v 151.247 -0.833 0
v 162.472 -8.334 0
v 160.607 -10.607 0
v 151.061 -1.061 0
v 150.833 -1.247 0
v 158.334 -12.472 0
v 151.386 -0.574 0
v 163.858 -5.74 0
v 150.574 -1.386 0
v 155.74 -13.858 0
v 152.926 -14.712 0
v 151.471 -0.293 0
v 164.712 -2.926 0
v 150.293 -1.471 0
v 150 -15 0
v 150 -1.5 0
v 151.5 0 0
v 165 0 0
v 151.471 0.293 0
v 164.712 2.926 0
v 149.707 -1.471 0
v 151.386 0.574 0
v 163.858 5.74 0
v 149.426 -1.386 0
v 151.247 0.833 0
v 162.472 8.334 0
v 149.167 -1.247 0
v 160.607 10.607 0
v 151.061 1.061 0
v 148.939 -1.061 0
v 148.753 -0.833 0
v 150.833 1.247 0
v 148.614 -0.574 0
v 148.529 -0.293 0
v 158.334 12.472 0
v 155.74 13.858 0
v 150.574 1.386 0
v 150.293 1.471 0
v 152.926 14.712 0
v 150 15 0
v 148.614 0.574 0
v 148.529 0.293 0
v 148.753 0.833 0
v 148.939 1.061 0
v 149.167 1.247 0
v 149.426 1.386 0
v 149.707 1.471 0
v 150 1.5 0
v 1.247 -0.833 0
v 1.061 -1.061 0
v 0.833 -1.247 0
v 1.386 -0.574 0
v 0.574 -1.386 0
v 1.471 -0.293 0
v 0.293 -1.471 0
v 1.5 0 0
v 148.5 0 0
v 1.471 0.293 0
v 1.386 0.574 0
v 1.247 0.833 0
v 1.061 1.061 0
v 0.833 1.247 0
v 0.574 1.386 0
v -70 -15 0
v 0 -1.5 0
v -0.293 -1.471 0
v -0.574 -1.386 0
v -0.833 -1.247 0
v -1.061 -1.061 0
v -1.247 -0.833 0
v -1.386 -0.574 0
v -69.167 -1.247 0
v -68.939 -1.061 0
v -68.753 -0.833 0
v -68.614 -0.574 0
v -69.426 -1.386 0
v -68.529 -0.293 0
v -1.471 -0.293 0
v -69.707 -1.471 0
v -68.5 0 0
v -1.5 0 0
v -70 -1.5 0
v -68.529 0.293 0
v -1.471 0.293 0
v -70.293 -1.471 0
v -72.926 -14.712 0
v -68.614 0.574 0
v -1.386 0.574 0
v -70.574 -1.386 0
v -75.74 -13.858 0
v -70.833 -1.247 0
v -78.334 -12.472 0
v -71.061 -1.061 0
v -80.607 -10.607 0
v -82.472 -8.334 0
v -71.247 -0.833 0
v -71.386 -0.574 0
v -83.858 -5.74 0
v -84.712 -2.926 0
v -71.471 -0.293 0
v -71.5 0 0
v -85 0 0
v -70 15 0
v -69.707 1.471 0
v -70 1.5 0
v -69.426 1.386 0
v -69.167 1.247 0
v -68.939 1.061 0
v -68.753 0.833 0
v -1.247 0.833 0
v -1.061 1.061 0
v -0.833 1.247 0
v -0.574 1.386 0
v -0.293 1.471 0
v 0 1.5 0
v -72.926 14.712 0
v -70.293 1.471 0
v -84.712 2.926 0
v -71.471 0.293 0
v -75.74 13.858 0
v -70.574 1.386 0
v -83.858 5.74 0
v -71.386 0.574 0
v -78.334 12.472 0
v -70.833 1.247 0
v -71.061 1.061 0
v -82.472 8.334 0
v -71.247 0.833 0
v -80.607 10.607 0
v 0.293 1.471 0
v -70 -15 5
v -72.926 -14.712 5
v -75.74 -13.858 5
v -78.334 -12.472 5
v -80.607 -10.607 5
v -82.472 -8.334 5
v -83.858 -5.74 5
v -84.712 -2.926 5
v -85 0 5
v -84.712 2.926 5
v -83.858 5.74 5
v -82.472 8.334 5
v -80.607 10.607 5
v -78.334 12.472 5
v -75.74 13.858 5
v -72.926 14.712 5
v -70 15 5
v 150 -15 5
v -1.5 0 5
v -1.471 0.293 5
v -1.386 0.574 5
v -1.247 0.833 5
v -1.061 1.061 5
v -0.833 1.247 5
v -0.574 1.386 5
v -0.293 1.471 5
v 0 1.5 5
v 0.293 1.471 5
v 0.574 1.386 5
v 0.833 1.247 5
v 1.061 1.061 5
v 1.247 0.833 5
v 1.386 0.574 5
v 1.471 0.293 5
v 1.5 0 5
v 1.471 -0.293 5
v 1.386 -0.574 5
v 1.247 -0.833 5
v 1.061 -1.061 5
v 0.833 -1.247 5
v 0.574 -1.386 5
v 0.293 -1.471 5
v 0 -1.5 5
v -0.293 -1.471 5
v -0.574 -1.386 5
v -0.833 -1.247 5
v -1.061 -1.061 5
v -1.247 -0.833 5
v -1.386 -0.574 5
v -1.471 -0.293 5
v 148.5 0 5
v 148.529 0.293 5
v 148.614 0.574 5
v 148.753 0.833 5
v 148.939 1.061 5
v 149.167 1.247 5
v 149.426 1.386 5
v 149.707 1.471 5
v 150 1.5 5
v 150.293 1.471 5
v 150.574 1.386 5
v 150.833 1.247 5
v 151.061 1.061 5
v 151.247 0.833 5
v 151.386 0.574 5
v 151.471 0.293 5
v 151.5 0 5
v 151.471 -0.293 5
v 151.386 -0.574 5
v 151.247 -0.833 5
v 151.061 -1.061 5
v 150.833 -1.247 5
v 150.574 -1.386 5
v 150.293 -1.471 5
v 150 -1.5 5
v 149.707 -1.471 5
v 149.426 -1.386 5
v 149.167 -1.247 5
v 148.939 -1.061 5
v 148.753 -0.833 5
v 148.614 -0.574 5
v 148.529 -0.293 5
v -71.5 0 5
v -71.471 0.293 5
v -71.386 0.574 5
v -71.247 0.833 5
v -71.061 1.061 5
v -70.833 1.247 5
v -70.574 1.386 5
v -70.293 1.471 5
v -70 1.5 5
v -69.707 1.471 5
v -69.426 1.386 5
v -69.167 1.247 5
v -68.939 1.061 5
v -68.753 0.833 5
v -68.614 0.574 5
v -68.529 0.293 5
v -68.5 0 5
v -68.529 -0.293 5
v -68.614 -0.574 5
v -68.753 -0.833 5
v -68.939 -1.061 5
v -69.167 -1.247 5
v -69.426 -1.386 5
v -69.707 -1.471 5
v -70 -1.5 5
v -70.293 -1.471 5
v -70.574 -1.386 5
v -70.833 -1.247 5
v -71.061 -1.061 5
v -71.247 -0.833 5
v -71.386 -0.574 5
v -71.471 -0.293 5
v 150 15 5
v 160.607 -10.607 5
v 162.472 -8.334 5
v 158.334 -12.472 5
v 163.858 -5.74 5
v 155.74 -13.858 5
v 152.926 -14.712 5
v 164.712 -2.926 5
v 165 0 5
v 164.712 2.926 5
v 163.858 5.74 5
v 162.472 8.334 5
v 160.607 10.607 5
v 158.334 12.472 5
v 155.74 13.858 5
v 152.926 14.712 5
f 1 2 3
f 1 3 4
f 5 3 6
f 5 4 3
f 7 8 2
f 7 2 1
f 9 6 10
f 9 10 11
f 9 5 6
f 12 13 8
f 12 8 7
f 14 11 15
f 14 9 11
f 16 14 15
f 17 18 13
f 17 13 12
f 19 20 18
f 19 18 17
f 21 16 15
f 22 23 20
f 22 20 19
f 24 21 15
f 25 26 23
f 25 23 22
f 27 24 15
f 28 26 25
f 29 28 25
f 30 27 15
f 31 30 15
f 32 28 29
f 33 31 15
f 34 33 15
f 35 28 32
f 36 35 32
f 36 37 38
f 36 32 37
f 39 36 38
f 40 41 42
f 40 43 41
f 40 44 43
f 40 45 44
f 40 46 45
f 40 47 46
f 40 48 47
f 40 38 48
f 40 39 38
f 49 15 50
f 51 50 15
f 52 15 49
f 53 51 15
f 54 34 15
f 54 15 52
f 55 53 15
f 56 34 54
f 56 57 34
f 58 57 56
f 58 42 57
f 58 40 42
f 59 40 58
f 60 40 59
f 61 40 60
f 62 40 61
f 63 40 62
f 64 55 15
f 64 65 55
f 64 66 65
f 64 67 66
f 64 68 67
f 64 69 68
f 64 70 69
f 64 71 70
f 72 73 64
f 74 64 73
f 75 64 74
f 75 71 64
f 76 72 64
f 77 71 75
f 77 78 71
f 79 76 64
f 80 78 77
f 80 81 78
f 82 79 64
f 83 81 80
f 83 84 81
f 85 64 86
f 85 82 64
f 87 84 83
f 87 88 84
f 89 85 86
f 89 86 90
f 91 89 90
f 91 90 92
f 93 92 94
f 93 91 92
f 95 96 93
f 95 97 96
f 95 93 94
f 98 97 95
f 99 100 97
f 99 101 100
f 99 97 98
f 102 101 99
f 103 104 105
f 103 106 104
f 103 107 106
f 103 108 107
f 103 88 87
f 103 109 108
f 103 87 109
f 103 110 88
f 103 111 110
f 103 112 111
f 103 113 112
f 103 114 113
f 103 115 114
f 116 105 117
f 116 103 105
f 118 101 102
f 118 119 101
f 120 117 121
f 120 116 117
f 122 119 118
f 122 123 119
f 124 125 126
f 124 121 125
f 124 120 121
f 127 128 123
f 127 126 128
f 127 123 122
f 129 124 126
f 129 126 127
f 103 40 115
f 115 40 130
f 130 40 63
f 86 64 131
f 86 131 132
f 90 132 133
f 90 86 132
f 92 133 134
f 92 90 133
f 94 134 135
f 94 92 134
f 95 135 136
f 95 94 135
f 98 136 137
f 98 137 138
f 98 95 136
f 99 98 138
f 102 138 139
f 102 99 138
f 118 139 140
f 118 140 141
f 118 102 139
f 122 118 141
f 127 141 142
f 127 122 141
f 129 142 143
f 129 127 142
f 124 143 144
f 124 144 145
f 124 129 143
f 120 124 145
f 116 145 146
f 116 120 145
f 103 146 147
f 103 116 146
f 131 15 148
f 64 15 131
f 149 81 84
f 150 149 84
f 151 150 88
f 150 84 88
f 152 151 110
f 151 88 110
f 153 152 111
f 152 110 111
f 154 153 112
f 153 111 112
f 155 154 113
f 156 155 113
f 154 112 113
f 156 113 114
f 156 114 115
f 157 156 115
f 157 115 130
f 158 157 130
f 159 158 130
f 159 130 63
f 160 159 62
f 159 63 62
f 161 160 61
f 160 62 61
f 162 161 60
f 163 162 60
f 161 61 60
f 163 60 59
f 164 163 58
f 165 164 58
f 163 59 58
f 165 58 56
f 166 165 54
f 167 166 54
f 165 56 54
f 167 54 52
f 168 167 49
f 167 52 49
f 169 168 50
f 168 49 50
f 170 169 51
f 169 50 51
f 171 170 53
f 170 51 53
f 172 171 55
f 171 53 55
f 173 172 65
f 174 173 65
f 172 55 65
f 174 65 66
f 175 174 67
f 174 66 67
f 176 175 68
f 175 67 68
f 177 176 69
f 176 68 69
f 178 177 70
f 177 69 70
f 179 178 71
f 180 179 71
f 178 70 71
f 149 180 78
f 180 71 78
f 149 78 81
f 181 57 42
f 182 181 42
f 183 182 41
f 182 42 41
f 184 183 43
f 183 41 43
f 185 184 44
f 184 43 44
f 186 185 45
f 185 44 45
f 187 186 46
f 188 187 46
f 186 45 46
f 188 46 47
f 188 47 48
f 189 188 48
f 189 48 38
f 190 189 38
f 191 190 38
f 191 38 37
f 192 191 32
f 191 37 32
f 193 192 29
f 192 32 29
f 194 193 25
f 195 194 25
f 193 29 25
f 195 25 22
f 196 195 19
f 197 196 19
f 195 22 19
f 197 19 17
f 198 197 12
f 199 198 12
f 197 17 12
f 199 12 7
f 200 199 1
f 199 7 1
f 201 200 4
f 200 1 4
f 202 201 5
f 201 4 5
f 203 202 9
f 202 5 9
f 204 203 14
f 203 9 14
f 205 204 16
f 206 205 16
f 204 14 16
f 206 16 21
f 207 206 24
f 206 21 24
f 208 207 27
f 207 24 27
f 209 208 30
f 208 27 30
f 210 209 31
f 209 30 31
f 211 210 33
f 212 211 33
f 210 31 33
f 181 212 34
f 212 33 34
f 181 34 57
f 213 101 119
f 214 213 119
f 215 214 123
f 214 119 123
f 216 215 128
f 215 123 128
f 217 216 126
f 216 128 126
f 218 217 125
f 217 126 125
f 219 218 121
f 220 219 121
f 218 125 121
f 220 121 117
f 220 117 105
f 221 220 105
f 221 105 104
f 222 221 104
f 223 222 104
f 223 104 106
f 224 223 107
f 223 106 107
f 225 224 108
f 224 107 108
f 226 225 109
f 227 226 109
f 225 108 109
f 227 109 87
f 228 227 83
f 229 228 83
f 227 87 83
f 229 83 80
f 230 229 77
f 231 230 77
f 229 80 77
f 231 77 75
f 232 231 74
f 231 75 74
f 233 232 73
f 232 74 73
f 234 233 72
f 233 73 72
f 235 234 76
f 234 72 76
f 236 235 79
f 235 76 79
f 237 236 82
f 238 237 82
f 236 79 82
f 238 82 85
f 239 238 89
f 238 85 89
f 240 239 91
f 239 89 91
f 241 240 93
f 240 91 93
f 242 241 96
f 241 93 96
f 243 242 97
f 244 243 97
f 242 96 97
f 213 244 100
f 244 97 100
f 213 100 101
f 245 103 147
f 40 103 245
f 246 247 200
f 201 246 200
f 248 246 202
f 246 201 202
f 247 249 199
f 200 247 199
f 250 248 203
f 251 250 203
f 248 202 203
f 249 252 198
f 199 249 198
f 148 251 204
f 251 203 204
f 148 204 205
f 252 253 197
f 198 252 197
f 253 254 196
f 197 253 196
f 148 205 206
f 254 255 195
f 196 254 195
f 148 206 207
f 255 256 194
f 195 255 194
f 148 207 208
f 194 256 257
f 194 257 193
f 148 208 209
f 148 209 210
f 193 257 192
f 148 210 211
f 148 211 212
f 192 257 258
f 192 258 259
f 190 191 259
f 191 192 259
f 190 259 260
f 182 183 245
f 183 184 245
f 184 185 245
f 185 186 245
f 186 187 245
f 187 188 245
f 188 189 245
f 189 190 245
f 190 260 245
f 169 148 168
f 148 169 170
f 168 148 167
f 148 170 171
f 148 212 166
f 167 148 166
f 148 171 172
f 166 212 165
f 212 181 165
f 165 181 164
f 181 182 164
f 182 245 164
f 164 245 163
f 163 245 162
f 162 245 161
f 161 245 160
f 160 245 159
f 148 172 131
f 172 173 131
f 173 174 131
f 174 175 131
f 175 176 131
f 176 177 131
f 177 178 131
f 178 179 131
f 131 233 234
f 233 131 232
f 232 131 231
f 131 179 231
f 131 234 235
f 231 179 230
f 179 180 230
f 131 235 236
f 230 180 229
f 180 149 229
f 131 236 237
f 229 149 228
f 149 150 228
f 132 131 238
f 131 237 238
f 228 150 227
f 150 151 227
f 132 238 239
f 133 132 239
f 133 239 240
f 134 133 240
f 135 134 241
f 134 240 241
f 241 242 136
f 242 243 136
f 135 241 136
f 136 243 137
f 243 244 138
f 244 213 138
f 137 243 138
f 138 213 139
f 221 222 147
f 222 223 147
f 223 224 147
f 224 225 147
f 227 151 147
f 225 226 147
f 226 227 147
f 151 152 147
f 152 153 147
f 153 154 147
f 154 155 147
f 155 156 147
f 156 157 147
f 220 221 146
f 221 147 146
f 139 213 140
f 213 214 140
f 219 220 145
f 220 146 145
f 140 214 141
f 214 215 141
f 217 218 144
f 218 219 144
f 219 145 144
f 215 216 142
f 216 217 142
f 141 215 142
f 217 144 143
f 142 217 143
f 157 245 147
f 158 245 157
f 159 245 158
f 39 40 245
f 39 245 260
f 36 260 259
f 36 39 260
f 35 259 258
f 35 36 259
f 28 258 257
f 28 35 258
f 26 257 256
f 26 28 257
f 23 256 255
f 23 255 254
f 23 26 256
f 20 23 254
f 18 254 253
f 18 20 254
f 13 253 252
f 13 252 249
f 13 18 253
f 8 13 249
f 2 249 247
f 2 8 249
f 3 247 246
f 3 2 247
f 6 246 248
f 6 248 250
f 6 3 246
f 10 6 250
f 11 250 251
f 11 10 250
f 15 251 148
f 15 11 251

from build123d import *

# Parameters (mm, degrees)
BOSS_EXTRUDE1_DEPTH = 5
SKETCH4_R           = 1.5
CUT_EXTRUDE1_DEPTH  = 5


with BuildPart() as part:
    # Sketch3 → Boss-Extrude1 (new body)
    with BuildSketch(Plane.XY):
        with BuildLine():
            Line((-70, 15), (150, 15))
            ThreePointArc((150, 15), (165, 0), (150, -15))
            Line((150, -15), (-70, -15))
            ThreePointArc((-70, -15), (-85, 0), (-70, 15))
        make_face()
    extrude(amount=BOSS_EXTRUDE1_DEPTH)

    # Sketch4 → Cut-Extrude1 (cut)
    with BuildSketch(Plane(origin=(0, 0, 0), x_dir=(-1, 0, 0), z_dir=(0, 0, -1))):
        with Locations((-150, 0)):
            Circle(SKETCH4_R)
        Circle(SKETCH4_R)
        with Locations((70, 0)):
            Circle(SKETCH4_R)
    extrude(amount=-CUT_EXTRUDE1_DEPTH, mode=Mode.SUBTRACT)


solid = part.part
